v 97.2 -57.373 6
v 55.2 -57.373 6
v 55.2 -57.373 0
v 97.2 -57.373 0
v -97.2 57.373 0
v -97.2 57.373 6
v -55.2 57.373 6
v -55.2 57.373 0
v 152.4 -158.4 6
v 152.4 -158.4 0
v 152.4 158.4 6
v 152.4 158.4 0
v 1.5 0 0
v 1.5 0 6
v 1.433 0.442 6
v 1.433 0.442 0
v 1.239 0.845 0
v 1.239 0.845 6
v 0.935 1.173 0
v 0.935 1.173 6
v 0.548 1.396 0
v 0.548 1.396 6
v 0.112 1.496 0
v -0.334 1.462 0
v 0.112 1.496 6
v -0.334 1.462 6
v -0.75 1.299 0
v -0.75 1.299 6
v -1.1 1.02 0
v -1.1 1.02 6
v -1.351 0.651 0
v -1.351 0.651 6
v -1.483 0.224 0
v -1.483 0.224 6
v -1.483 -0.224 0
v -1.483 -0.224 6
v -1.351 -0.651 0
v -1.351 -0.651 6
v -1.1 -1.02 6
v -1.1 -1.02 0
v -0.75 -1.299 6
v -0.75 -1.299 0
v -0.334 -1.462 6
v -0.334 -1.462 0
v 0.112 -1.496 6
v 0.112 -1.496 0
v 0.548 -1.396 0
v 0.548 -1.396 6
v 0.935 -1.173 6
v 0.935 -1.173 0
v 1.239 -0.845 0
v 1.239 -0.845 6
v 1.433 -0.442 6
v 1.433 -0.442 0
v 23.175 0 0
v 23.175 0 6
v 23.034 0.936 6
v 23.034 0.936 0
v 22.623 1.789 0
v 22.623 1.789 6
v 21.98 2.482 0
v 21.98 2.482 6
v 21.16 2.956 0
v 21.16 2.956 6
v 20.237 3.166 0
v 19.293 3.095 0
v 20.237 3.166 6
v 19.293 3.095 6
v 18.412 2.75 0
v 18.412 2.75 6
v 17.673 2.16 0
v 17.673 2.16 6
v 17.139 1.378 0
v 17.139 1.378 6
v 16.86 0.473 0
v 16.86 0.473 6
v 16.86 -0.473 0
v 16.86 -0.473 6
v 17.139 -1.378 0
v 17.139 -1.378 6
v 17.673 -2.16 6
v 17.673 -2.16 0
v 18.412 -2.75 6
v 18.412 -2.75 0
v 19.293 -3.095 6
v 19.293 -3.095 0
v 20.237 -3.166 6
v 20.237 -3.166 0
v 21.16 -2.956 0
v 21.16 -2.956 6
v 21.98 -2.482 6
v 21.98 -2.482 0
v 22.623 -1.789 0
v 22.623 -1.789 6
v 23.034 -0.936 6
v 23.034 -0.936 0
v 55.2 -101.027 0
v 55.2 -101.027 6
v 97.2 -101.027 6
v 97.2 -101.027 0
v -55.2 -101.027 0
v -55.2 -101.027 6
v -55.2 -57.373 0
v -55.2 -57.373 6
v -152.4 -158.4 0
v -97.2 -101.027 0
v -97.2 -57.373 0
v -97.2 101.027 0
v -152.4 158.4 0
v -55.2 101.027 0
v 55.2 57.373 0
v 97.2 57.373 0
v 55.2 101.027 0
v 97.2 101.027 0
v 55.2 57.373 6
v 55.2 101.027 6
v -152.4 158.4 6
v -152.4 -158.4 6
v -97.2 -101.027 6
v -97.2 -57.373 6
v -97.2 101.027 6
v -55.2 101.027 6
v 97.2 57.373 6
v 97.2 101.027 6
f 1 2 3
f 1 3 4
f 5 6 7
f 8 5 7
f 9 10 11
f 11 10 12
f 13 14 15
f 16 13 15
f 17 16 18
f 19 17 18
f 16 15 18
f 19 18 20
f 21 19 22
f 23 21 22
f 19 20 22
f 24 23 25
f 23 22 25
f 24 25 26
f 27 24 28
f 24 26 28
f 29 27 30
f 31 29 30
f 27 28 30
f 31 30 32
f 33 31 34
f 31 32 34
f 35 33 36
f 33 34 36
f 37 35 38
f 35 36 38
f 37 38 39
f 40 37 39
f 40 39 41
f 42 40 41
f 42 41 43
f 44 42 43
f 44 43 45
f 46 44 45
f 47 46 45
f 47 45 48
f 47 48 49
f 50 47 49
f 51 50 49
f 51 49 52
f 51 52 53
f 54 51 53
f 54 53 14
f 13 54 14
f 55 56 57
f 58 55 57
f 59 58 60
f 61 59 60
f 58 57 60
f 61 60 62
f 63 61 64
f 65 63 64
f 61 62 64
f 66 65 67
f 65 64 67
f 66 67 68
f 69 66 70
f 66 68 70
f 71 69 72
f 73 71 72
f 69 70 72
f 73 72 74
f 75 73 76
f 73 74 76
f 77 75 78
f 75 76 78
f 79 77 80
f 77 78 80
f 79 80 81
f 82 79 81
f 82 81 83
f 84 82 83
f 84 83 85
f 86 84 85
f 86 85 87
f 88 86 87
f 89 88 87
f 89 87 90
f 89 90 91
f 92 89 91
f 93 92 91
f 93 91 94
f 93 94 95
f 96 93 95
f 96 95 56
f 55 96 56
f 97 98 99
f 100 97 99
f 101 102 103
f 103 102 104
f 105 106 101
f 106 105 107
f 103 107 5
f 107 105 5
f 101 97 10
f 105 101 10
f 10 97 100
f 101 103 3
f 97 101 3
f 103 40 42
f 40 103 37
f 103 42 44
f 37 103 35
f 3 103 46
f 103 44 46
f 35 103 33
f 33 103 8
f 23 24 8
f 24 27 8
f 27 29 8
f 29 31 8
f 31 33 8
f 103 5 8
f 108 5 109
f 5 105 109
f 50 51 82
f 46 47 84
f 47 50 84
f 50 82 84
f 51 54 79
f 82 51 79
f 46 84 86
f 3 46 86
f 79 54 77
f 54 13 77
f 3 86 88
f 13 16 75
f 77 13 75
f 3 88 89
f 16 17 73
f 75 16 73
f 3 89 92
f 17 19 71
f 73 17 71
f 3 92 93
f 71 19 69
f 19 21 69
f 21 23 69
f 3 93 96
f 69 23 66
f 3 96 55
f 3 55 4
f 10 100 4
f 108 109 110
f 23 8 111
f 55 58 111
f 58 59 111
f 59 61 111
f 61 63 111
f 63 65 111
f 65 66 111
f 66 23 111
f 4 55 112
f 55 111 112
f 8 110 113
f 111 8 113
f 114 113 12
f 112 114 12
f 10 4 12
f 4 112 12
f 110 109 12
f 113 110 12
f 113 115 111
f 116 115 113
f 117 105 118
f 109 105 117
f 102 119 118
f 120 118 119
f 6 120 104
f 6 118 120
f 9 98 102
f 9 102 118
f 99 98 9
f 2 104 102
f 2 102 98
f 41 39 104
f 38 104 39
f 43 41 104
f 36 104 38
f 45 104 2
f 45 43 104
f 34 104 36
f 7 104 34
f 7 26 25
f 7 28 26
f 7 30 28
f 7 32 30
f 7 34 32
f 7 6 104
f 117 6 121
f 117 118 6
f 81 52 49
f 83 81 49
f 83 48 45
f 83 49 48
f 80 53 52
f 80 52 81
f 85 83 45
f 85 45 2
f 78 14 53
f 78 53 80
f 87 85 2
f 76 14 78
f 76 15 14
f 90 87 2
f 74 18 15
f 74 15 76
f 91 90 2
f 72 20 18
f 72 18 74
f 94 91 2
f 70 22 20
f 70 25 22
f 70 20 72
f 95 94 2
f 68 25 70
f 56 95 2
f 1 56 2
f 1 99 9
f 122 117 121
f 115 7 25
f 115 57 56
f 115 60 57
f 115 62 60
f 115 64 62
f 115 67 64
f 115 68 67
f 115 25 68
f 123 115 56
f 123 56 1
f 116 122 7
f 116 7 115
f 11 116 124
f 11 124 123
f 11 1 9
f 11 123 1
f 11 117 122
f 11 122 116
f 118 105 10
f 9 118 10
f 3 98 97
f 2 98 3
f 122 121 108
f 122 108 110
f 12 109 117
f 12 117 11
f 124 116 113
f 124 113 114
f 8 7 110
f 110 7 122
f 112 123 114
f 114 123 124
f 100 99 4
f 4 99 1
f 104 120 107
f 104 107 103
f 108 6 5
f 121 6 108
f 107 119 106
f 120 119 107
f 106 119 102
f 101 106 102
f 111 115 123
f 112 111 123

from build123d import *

# Parameters (mm, degrees)
SKETCH1_W           = 304.8
SKETCH1_H           = 316.8
BOSS_EXTRUDE1_DEPTH = 6
SKETCH3_W           = 42
SKETCH3_H           = 43.653543308
CUT_EXTRUDE2_DEPTH  = 220.891609663
SKETCH4_R           = 1.5
CUT_EXTRUDE3_DEPTH  = 220.891609663
SKETCH5_R           = 3.175
CUT_EXTRUDE4_DEPTH  = 220.891609663


with BuildPart() as part:
    # Sketch1 → Boss-Extrude1 (new body)
    with BuildSketch(Plane.XY):
        Rectangle(SKETCH1_W, SKETCH1_H)
    extrude(amount=BOSS_EXTRUDE1_DEPTH)

    # Sketch3 → Cut-Extrude2 (cut, through all)
    with BuildSketch(Plane.XY.offset(6)):
        with Locations((-76.2, 79.2)):
            Rectangle(SKETCH3_W, SKETCH3_H)
        with Locations((76.2, 79.2)):
            Rectangle(SKETCH3_W, SKETCH3_H)
        with Locations((76.2, -79.2)):
            Rectangle(SKETCH3_W, SKETCH3_H)
        with Locations((-76.2, -79.2)):
            Rectangle(SKETCH3_W, SKETCH3_H)
    extrude(amount=-CUT_EXTRUDE2_DEPTH, mode=Mode.SUBTRACT)

    # Sketch4 → Cut-Extrude3 (cut, through all)
    with BuildSketch(Plane.XY.offset(6)):
        Circle(SKETCH4_R)
    extrude(amount=-CUT_EXTRUDE3_DEPTH, mode=Mode.SUBTRACT)

    # Sketch5 → Cut-Extrude4 (cut, through all)
    with BuildSketch(Plane.XY.offset(6)):
        with Locations((20, 0)):
            Circle(SKETCH5_R)
    extrude(amount=-CUT_EXTRUDE4_DEPTH, mode=Mode.SUBTRACT)


solid = part.part
